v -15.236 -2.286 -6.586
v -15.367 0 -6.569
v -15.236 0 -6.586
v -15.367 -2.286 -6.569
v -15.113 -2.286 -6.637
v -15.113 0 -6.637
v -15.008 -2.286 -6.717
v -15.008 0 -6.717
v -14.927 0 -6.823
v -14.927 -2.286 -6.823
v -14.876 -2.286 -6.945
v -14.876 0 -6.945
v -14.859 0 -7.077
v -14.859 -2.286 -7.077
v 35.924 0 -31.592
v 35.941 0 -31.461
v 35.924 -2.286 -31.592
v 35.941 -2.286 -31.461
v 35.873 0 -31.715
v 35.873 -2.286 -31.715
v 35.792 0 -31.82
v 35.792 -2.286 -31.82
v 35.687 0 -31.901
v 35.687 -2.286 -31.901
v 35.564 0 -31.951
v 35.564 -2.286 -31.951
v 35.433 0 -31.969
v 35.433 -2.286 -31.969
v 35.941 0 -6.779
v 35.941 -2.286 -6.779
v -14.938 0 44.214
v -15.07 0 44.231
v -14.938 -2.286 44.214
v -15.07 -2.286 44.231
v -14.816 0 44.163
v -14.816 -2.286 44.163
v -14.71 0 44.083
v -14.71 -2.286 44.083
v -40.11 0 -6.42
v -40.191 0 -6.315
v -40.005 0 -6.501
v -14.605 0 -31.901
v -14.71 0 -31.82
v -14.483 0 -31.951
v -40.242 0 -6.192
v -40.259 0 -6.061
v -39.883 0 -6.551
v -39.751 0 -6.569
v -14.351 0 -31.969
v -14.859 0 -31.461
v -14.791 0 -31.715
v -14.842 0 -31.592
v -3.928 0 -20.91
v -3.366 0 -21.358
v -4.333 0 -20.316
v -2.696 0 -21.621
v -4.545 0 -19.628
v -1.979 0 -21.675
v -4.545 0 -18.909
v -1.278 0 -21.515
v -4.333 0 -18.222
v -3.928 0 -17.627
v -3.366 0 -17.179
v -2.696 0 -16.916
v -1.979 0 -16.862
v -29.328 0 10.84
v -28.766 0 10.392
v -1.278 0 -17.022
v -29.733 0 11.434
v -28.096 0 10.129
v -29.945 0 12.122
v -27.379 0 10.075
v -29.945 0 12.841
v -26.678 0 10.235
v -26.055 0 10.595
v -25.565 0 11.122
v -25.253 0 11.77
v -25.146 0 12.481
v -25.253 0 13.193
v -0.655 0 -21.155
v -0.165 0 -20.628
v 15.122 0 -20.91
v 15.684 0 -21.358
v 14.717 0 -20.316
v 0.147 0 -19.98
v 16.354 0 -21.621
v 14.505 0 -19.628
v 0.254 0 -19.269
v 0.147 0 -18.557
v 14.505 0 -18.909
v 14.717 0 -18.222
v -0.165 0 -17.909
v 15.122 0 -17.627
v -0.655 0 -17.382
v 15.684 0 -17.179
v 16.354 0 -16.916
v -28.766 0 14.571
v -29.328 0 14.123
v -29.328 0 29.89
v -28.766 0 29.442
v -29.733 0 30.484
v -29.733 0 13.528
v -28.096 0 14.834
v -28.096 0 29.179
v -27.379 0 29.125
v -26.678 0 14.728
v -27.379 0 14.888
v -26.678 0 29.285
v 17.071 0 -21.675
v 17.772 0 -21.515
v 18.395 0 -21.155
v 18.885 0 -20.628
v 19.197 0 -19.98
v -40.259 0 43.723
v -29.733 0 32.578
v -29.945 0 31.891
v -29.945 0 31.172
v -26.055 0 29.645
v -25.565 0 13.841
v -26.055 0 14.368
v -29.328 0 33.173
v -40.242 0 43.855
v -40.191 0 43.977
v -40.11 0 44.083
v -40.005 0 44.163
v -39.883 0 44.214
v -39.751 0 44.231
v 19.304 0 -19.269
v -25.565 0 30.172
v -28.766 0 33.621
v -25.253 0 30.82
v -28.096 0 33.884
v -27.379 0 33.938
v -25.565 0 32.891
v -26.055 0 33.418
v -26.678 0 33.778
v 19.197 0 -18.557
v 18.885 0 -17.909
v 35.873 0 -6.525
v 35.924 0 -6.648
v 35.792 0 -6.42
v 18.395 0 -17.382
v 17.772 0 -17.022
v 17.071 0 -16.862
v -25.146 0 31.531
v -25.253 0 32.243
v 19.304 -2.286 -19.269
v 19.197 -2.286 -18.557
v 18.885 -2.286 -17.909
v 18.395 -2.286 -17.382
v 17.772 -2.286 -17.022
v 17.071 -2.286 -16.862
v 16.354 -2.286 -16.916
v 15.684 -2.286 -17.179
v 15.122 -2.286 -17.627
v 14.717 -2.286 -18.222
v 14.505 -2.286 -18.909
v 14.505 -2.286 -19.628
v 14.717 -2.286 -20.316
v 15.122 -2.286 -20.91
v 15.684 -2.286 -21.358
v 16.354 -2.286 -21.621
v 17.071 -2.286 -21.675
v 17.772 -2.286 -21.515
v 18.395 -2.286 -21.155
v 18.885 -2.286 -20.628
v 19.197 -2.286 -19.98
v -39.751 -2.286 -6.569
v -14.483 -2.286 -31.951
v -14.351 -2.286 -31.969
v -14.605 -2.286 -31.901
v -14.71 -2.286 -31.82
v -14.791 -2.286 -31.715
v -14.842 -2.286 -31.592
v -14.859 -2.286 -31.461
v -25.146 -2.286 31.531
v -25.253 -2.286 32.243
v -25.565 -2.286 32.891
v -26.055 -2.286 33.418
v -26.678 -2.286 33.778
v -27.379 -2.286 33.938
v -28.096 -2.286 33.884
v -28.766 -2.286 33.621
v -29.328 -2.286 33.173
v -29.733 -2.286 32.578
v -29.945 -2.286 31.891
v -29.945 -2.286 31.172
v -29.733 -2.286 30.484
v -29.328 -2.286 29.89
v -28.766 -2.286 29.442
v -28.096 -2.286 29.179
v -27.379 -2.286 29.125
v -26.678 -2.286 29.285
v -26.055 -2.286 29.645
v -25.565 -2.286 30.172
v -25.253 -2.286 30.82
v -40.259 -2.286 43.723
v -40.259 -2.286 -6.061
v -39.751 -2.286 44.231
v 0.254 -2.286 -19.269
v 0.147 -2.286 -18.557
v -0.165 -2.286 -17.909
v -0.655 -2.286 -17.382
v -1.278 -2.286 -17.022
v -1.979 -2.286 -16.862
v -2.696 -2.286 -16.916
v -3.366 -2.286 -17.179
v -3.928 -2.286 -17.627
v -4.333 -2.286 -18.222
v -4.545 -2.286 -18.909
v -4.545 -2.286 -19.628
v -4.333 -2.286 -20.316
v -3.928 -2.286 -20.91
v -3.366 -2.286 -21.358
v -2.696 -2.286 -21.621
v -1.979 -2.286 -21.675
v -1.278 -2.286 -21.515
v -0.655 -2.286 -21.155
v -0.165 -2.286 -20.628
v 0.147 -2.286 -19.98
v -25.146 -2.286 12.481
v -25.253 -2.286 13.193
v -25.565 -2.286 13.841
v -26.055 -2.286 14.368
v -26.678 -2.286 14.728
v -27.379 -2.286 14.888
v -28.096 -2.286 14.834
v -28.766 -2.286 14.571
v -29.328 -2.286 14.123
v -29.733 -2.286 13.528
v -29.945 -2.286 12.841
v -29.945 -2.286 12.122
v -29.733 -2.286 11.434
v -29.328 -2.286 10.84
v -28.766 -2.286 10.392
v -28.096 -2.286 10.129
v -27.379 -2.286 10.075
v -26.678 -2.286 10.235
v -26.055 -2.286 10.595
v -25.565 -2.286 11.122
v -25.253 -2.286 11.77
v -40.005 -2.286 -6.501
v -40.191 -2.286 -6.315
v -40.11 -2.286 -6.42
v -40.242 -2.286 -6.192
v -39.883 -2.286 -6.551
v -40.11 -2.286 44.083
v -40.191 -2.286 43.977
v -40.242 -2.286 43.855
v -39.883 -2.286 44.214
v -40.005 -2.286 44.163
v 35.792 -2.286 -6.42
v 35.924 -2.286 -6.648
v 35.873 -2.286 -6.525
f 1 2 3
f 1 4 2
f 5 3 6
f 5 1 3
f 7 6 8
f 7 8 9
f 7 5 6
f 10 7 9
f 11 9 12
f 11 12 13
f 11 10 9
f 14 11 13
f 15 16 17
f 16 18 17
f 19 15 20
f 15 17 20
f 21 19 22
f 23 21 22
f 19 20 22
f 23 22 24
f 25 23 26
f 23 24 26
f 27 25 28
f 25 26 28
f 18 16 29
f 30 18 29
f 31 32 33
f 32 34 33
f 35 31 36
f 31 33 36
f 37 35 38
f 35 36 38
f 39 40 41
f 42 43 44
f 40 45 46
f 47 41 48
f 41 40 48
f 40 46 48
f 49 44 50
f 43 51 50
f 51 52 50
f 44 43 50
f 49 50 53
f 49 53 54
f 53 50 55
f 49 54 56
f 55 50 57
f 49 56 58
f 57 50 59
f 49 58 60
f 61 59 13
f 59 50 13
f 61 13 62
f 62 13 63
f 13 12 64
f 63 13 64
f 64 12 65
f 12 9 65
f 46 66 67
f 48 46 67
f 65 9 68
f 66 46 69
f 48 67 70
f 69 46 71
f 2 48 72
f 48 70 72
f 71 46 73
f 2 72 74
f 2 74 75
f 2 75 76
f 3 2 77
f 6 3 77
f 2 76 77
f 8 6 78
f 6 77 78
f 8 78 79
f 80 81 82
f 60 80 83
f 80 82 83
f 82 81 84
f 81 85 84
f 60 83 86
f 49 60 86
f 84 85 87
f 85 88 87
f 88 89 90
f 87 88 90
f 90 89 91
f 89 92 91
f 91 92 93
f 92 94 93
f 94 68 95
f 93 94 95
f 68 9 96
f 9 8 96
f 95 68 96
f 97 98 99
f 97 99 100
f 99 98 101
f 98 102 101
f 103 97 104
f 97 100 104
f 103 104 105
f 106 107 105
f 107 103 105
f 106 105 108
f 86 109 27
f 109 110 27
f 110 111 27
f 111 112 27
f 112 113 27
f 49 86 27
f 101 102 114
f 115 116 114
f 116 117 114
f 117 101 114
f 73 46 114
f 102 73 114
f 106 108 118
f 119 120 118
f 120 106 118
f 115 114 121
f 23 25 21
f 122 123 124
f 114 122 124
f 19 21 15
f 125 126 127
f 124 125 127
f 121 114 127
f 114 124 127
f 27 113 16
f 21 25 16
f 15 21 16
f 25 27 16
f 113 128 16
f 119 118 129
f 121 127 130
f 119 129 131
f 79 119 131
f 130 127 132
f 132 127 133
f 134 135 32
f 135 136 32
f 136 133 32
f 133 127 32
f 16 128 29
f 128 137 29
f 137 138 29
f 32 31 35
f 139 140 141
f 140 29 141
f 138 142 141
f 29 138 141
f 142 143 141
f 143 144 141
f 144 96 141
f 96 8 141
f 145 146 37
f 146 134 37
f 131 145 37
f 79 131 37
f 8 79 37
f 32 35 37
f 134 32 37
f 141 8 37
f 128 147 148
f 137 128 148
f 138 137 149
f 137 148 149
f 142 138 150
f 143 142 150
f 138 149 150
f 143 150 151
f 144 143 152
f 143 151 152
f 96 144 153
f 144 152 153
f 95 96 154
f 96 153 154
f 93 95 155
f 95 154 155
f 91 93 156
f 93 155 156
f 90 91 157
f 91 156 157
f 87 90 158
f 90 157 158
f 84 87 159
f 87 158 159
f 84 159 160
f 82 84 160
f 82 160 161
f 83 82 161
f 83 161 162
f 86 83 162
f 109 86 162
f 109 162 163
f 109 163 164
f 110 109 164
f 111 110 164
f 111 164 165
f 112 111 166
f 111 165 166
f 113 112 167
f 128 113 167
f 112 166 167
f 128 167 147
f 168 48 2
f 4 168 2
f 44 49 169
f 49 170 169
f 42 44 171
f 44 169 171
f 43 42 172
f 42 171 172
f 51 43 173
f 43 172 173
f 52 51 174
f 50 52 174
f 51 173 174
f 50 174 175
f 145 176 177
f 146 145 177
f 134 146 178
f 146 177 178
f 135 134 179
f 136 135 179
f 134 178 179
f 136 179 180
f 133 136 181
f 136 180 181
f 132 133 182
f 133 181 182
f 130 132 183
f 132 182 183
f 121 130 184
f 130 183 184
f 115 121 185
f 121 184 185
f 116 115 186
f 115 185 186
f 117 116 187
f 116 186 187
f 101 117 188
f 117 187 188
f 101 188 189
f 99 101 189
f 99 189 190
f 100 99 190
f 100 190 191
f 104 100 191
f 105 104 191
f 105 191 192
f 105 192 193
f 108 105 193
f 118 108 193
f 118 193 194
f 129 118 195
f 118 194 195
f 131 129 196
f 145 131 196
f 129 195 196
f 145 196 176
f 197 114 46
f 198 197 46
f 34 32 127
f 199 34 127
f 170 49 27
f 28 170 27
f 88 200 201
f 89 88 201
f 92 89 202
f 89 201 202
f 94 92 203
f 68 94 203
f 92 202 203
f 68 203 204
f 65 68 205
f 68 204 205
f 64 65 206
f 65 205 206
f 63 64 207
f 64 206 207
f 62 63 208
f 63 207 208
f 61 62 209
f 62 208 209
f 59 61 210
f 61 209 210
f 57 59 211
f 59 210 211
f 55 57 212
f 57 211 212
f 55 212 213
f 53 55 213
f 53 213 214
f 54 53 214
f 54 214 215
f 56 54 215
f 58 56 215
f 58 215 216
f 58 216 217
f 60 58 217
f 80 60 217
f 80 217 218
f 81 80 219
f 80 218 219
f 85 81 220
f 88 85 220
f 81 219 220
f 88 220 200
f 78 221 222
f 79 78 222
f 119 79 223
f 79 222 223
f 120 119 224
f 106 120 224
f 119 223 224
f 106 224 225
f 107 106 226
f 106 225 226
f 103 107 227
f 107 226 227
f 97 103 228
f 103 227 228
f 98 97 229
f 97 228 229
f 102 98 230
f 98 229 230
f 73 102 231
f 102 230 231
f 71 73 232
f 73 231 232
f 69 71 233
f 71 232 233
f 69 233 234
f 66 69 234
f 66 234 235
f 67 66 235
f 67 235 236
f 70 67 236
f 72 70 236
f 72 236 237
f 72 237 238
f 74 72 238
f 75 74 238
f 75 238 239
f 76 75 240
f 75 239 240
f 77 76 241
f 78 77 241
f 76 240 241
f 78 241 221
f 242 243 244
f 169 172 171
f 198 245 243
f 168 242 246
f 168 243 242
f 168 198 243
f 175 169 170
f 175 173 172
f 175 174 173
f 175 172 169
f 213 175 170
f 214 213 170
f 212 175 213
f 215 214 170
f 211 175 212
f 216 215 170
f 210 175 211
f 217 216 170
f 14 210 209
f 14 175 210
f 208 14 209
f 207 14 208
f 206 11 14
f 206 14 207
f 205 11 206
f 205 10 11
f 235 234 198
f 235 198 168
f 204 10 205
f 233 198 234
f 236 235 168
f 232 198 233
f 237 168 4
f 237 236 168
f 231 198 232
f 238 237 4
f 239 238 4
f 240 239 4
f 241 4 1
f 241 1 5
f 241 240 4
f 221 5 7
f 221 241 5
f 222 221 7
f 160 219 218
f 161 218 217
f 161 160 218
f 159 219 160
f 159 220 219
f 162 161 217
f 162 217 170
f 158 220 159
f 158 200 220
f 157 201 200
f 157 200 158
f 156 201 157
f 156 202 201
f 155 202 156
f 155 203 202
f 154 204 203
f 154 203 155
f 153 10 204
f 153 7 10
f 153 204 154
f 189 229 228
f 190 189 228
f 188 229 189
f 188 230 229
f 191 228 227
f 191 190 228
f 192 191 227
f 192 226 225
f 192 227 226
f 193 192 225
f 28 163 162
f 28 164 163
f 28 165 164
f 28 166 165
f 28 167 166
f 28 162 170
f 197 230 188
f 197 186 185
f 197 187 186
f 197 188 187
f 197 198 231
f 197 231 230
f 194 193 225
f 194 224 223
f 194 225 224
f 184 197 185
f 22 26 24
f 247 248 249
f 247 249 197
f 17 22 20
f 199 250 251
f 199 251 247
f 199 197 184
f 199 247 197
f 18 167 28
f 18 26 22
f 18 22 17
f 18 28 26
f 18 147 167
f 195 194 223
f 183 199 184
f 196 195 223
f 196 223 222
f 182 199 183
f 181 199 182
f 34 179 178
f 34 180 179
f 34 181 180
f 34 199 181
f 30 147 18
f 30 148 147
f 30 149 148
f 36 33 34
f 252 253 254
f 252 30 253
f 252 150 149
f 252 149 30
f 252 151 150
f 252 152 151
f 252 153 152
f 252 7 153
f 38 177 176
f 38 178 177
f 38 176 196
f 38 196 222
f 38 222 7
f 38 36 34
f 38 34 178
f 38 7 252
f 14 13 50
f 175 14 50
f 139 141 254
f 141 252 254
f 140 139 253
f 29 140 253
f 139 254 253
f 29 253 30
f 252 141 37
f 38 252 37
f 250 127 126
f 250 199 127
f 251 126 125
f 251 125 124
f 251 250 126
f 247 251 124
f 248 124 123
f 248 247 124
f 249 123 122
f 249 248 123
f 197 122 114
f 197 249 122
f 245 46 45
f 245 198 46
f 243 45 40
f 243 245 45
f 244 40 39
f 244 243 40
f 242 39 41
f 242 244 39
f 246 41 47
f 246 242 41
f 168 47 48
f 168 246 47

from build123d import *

# Parameters (mm, degrees)
F1_DEPTH = 2.286
F2_R     = 2.413
F3_DEPTH = 2.286
F4_R     = 0.508


with BuildPart() as f1:
    # F0 (on Front) → F1 (new body)
    with BuildSketch(Plane.XZ):
        Polygon((-14.859182, 44.231349), (-40.259182, 44.231349), (-40.259182, -6.568651), (-14.859182, -6.568651), (-14.859182, -31.968651), (35.940818, -31.968651), (35.940818, -6.568651), align=None)
    extrude(amount=F1_DEPTH)

    # F2 (on face) → F3 (cut)
    with BuildSketch(Plane.XZ.offset(2.286)):
        with Locations((-27.559182, 31.531349)):
            Circle(F2_R)
        with Locations((-27.559182, 12.481349)):
            Circle(F2_R)
        with Locations((-2.159182, -19.268651)):
            Circle(F2_R)
        with Locations((16.890818, -19.268651)):
            Circle(F2_R)
    extrude(amount=-F3_DEPTH, mode=Mode.SUBTRACT)

    # F4
    f4_edges = [f1.edges().sort_by_distance(p)[0] for p in [
        (-40.259182, -1.143, 44.231349),
        (-40.259182, -1.143, -6.568651),
        (-14.859182, -1.143, -31.968651),
        (-14.859182, -1.143, -6.568651),
        (35.940818, -1.143, -31.968651),
        (35.940818, -1.143, -6.568651),
        (-14.859182, -1.143, 44.231349),
    ]]
    fillet(f4_edges, radius=F4_R)


solid = f1.part
